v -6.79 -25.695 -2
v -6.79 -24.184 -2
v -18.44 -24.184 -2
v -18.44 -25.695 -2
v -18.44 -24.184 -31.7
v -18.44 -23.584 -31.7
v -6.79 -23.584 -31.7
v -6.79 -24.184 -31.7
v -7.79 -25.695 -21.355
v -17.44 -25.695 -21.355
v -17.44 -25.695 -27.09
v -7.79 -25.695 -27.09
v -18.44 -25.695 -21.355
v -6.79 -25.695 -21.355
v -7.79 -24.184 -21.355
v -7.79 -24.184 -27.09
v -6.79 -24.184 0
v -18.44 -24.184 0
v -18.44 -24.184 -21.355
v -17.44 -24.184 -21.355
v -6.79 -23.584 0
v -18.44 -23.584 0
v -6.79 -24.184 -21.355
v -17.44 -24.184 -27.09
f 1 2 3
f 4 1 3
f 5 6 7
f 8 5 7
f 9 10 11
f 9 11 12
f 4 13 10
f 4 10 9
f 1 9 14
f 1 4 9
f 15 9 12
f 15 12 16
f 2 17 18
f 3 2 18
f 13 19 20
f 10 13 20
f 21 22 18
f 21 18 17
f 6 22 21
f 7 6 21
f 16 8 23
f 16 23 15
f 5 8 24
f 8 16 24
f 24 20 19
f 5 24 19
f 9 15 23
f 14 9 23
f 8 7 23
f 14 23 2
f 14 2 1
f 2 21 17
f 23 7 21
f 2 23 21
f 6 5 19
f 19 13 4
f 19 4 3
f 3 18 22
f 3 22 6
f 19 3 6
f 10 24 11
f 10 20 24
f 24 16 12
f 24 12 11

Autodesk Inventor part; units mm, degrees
ref_plane "Work Plane1" through (0, 0, 0) normal (0, 0, 1) x (1, 0, 0)
sketch "Sketch1" plane through (0, 0, 0) normal (0, 0, 1) x (1, 0, 0)
  line L0 (-18.6403, -24.384) -> (-6.5903, -24.384) projected
  line L1 (-6.5903, -24.384) -> (-6.5903, -23.384) projected
  line L2 (-6.5903, -23.384) -> (-18.6403, -23.384) projected
  line L3 (-18.6403, -23.384) -> (-18.6403, -24.384) projected
  line L4 (-18.4403, -23.584) -> (-6.7903, -23.584)
  line L5 (-6.7903, -23.584) -> (-6.7903, -24.184)
  line L6 (-6.7903, -24.184) -> (-18.4403, -24.184)
  line L7 (-18.4403, -24.184) -> (-18.4403, -23.584)
  point P0 (0, 0)
  dimension "d0" = 0.2
ref_plane "Work Plane2" through (-20.1778, -24.509, -31.7) normal (0, 0, -1) x (0, 1, 0)
extrude "Extrusion1" add sketch "Sketch1" against normal up to surface (31.7 mm away) contours L4 L5 L6 L7
sketch "Sketch2" plane through (-18.4403, -24.184, 0) normal (0, -1, 0) x (1, 0, 0)
  line L0 (12.815, -1.2) -> (-1.155, -1.2) projected
  line L1 (-1.155, -22.155) -> (12.815, -22.155) projected
  line L2 (12.815, -2) -> (-1.155, -2)
  line L3 (-1.155, -21.355) -> (12.815, -21.355)
  line L4 (0, 0) -> (0, -31.7) projected
  line L5 (11.65, 0) -> (11.65, -31.7) projected
  point P0 (18.4403, 0)
  point P1 (11.65, -21.355)
  point P2 (11.65, -2)
  point P3 (0, -2)
  point P4 (0, -21.355)
  dimension "d3" = 0.8
  dimension "d4" = 0.8
ref_plane "Work Plane3" through (-12.6103, -25.6952, -11.6775) normal (0, 1, 0) x (0, 0, 1)
extrude "Extrusion2" add sketch "Sketch2" along normal up to surface (1.5112 mm away) contours L5 L3 L4 L2
sketch "Sketch3" plane through (-6.7903, -24.184, -21.355) normal (0, 0, -1) x (-1, 0, 0)
  line L0 (0, 0) -> (11.65, 0) projected
  line L1 (11.65, -1.5112) -> (0, -1.5112) projected
  line L2 (1, 0) -> (10.65, 0)
  line L3 (10.65, 0) -> (10.65, -1.5112)
  line L4 (10.65, -1.5112) -> (1, -1.5112)
  line L5 (1, -1.5112) -> (1, 0)
  line L6 (-1.05, -0.2) -> (2.45, -3.7) projected
  line L7 (8.7, -4.2) -> (12.7, -0.2) projected
  line L8 (0, 0) -> (0, -1.5112) projected
  line L9 (11.65, 0) -> (11.65, -1.5112) projected
  point P0 (-6.7903, 24.184)
  point P1 (1, -1.5112)
  dimension "d7" = 1
  dimension "d8" = 1
ref_plane "Work Plane4" through (-15.4903, -24.384, -27.0904) normal (0, 0, 1) x (1, 0, 0)
extrude "Extrusion3" add sketch "Sketch3" along normal up to surface (5.7354 mm away) contours L0 L3 L1 L5
sketch "Sketch4" plane through (-18.4403, -25.6952, -2) normal (0, -1, 0) x (1, 0, 0)
  line L0 (0, 2) -> (0, -29.7) projected
  line L1 (11.65, 2) -> (11.65, -29.7) projected
  line L2 (0, -14.85) -> (11.65, -14.85)
  line L3 (11.65, -14.85) -> (11.65, -13.85)
  line L4 (11.65, -13.85) -> (0, -13.85)
  line L5 (0, -13.85) -> (0, -14.85)
  line L6 (0, -5.2891) -> (11.65, -5.2891)
  line L7 (11.65, -5.2891) -> (11.65, -4.2891)
  line L8 (11.65, -4.2891) -> (0, -4.2891)
  line L9 (0, -4.2891) -> (0, -5.2891)
  point P0 (18.4403, 2)
  point P1 (0, -4.2891)
  point P2 (0, -5.2891)
  point P3 (0, -13.85)
  dimension "d11" = 1
  dimension "d12" = 1
ref_plane "Work Plane5" through (-21.5003, -26, -22.155) normal (0, 1, 0) x (0, 0, 1)
extrude "Extrusion4" [suppressed]
fillet "Fillet1" [suppressed]
equation "\"d8\" = d7"
equation "\"d12\" = d11"
properties part number "MCU seatbelt"
